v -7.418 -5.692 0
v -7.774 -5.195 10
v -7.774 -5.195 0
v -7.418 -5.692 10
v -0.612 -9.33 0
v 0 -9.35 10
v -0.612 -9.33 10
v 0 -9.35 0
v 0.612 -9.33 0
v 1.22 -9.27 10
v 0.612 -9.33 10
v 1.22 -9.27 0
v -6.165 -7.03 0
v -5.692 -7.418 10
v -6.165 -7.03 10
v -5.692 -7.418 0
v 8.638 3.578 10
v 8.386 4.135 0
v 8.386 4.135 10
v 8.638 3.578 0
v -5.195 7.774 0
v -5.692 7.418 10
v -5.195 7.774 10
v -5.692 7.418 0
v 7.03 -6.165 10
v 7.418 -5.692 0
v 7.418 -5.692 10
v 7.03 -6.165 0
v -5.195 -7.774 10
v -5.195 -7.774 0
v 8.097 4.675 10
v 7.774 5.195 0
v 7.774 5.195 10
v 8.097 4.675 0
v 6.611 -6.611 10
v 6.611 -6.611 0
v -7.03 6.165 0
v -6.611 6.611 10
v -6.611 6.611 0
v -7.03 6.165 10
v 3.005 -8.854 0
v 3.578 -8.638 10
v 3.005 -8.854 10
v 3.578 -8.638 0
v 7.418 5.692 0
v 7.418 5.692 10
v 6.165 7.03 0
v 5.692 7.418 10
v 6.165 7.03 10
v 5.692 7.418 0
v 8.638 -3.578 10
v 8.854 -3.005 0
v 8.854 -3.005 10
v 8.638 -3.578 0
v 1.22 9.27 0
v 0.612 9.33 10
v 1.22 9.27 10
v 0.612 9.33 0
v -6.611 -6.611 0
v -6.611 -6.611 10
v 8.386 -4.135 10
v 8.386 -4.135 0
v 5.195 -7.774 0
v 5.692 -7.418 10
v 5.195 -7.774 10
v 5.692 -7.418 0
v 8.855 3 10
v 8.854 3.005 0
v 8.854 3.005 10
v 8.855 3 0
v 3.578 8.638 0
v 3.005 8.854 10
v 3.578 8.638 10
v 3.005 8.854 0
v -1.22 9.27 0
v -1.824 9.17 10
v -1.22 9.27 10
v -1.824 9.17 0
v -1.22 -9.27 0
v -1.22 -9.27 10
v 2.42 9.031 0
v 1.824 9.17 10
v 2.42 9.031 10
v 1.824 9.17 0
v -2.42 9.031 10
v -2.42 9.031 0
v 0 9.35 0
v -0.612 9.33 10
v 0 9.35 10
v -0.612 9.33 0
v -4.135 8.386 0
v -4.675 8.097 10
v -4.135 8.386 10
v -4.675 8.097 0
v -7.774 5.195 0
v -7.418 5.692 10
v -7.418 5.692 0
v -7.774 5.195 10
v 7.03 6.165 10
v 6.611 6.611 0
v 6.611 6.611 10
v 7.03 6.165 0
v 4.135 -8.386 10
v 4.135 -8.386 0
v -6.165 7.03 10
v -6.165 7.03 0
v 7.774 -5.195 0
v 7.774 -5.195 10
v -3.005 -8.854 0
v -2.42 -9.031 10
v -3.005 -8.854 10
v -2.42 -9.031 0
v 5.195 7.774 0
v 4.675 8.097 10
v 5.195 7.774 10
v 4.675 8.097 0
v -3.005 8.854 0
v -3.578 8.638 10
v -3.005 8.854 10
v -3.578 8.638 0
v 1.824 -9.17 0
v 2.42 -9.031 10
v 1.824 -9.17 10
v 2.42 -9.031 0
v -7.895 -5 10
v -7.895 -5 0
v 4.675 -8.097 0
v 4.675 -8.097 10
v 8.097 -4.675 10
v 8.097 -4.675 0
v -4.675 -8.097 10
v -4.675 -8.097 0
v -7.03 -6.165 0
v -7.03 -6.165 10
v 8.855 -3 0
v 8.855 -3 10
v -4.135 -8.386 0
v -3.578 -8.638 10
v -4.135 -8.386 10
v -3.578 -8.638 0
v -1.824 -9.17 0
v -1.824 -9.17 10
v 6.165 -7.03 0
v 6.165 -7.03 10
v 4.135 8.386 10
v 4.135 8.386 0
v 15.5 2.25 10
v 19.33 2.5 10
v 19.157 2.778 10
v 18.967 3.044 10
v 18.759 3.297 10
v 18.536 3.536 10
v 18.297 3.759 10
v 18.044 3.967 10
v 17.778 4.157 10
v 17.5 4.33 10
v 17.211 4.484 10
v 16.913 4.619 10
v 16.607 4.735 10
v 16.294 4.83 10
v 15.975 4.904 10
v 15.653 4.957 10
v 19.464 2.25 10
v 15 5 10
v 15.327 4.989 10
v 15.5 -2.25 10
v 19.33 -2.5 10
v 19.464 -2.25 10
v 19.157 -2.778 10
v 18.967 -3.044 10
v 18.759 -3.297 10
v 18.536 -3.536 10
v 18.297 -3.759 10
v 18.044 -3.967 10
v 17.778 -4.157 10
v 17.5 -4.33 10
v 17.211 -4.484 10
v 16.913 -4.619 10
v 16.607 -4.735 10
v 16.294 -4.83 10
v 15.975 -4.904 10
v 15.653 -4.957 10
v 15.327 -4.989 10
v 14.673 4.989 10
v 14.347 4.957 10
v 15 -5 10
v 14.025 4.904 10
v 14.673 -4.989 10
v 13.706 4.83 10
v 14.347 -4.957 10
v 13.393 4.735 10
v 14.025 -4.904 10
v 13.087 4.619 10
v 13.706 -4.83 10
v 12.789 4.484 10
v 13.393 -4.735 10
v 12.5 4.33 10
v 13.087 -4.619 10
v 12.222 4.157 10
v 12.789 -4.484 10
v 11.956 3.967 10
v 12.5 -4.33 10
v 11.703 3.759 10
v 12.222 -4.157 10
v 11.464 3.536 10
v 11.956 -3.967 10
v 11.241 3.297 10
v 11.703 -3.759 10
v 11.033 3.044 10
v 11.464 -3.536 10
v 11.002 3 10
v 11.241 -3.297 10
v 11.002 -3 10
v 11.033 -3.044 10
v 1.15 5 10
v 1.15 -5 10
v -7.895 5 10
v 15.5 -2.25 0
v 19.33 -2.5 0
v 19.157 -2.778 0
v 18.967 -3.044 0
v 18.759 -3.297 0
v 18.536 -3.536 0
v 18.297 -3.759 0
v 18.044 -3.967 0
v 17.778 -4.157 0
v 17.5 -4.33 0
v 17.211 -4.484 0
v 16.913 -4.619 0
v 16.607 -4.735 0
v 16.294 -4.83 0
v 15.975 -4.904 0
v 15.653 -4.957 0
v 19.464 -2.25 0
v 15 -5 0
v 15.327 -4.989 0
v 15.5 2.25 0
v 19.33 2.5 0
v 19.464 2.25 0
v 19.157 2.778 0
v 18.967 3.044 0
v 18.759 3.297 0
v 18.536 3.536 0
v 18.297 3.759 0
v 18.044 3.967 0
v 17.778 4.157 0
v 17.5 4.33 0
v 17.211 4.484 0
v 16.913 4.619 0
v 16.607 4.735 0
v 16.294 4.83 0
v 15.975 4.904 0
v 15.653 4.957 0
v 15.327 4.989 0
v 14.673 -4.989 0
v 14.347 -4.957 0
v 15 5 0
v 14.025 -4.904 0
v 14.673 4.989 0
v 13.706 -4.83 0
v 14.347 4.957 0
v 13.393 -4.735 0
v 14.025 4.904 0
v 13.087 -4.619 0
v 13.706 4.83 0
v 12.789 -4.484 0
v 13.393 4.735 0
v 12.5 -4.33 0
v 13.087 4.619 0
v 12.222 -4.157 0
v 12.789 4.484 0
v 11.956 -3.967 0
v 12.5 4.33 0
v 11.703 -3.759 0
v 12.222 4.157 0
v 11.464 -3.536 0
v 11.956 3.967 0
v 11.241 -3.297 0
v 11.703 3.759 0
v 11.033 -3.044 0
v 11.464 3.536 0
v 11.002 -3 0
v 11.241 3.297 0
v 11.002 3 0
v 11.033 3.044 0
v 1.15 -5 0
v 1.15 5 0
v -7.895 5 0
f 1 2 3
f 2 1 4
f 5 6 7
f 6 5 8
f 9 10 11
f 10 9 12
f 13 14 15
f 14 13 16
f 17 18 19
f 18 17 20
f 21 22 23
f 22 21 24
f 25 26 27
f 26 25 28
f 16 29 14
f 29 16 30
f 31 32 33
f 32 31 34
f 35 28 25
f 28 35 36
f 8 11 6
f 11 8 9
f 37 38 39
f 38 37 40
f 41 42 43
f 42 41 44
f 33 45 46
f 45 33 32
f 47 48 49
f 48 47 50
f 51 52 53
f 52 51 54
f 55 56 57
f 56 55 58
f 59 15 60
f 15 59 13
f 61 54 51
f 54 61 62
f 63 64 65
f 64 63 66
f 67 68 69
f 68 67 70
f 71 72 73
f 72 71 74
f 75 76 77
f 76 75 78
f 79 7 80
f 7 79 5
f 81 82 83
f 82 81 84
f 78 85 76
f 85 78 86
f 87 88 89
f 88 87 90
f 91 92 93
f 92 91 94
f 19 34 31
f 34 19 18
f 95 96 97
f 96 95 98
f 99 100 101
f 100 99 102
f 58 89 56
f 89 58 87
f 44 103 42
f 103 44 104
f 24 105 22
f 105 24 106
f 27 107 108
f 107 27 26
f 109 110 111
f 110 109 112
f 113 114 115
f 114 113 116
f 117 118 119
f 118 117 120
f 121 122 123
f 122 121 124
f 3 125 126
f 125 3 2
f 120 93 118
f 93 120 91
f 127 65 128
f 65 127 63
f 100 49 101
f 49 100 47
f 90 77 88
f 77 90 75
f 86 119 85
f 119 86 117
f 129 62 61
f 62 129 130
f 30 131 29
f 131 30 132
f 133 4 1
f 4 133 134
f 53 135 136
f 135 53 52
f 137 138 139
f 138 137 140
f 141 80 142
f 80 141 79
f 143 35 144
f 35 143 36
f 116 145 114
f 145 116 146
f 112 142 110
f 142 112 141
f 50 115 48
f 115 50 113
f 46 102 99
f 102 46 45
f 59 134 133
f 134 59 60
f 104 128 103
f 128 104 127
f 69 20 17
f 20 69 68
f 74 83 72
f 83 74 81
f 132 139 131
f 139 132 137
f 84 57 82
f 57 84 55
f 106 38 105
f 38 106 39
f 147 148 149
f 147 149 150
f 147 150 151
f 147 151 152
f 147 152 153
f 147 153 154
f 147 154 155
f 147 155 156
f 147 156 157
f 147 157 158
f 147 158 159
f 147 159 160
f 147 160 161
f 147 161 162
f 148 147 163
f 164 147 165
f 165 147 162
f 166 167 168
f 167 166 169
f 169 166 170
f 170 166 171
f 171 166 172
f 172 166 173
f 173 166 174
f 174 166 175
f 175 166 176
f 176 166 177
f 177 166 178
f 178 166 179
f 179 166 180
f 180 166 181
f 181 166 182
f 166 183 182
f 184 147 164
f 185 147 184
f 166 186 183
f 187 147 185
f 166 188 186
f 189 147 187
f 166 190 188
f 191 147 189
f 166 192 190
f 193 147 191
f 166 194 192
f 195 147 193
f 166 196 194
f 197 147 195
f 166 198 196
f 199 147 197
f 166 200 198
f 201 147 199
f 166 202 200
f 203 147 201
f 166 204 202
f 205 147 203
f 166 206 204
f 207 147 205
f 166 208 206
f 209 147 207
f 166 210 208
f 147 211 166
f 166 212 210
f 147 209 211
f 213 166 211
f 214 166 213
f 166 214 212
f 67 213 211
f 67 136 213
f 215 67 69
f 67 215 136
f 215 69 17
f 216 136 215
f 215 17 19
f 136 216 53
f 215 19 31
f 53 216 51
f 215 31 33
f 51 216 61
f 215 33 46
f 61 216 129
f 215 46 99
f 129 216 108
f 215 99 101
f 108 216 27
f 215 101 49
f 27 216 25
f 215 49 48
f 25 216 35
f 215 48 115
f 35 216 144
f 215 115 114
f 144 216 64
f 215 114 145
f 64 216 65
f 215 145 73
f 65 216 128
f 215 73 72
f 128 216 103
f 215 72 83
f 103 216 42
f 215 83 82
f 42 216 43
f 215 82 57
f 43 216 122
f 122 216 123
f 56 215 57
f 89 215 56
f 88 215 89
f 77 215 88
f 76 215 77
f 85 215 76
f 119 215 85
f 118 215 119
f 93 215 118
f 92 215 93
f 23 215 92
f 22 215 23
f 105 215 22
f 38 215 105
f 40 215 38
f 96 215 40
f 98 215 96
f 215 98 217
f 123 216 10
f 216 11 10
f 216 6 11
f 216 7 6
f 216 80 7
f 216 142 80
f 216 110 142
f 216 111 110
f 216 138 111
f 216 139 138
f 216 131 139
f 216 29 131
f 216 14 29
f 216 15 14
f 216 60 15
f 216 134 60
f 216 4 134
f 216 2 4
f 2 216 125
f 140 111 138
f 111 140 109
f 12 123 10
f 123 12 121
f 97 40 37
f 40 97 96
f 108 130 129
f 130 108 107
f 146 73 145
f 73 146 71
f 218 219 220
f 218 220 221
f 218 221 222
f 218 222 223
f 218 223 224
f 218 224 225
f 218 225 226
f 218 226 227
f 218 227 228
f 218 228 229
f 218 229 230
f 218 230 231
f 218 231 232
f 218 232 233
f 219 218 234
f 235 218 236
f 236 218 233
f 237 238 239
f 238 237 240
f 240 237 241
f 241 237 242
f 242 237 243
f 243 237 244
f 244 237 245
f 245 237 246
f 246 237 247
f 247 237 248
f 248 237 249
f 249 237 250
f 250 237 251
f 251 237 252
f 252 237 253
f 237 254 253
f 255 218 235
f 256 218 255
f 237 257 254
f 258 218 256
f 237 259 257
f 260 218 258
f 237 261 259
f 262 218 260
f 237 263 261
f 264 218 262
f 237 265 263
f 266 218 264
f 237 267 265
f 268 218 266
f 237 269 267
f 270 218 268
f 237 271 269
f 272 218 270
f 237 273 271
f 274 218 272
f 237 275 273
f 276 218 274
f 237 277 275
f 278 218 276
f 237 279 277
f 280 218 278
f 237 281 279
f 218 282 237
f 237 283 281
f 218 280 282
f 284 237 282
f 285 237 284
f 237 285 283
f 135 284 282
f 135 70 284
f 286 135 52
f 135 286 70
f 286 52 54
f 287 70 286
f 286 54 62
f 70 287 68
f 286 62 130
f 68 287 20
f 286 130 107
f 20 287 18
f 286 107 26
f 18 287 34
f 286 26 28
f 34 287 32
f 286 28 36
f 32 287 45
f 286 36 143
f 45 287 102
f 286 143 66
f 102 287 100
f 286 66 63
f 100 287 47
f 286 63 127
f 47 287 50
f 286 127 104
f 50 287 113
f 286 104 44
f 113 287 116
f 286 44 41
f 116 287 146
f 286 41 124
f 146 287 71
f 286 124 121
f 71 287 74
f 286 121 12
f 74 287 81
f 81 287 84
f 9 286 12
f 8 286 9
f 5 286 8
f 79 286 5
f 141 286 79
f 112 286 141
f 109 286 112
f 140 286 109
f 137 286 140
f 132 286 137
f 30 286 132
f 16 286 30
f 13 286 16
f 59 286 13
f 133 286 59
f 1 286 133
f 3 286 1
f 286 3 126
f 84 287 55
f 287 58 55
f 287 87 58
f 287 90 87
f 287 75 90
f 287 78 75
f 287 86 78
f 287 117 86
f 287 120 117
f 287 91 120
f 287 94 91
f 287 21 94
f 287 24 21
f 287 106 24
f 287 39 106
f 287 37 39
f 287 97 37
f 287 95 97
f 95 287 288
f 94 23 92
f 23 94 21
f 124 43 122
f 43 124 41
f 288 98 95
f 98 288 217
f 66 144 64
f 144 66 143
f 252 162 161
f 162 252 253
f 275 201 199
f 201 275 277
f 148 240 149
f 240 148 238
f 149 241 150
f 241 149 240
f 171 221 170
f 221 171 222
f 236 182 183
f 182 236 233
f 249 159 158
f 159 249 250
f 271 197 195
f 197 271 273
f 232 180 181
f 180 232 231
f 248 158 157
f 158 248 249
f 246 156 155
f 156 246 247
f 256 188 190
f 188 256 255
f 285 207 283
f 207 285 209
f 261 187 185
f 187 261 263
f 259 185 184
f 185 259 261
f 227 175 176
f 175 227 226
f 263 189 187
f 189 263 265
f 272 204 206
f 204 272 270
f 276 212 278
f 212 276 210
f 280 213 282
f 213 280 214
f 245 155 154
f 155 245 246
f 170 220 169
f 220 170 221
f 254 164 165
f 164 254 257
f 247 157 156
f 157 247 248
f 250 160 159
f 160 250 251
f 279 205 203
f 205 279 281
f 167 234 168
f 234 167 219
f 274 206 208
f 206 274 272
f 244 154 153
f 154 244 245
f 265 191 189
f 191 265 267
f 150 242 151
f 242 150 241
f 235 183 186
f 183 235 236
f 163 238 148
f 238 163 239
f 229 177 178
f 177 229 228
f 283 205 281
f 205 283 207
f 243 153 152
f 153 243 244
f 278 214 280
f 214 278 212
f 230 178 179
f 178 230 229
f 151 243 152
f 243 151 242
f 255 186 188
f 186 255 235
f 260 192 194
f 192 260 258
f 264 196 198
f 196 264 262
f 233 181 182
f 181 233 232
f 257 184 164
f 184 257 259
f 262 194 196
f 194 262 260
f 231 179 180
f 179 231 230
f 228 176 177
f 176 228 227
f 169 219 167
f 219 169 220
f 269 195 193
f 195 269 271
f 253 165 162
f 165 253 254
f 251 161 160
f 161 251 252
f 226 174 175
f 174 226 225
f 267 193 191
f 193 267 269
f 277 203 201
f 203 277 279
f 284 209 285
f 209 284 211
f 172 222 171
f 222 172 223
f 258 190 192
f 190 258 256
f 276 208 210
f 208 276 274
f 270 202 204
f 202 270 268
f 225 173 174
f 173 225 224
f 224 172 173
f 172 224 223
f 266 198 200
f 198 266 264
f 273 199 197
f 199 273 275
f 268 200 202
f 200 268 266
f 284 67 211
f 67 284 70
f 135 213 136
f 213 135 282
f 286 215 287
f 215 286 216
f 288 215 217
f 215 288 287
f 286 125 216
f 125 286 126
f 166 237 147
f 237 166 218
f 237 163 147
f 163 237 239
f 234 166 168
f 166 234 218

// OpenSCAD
// Tubing clip for 12.7 mm lab stand rod
// Print orientation: flat on bed, extrusion along +Z

$fn = 96;

// ---- Dimensions (mm) ----
rod_d      = 12.7;   // rod diameter
ring_w     = 3;      // rod ring wall
rod_od     = rod_d + 2*ring_w; // rod ring outer diameter (18.7)
opening_w  = 10;     // rod ring opening width (-X side)

tube_d     = 6;      // tubing inner diameter
tube_w     = 2;      // tubing wall
tube_od    = tube_d + 2*tube_w; // tubing outer diameter (10)
tube_open  = 4.5;    // tubing opening width (+X side)

bridge_w   = 6;      // bridge width (Y)
bridge_x0  = 8;      // bridge start (X)
bridge_x1  = 12;     // bridge end (X)

eps        = 0.5;    // cut overshoot

// ---- Model ----
difference() {
    union() {
        // Rod ring
        cylinder(d = rod_od, h = 10);
        // Tubing ring
        translate([15, 0, 0]) cylinder(d = tube_od, h = 10);
        // Bridge
        translate([bridge_x0, -bridge_w/2, 0])
            cube([bridge_x1 - bridge_x0, bridge_w, 10]);
    }
    // Rod opening
    translate([-rod_od/2 - eps, -opening_w/2, 0])
        cube([opening_w + 2*eps, opening_w, 10]);
    // Tubing opening
    translate([15 + eps, -tube_open/2, 0])
        cube([tube_open + 2*eps, tube_open, 10]);
}
